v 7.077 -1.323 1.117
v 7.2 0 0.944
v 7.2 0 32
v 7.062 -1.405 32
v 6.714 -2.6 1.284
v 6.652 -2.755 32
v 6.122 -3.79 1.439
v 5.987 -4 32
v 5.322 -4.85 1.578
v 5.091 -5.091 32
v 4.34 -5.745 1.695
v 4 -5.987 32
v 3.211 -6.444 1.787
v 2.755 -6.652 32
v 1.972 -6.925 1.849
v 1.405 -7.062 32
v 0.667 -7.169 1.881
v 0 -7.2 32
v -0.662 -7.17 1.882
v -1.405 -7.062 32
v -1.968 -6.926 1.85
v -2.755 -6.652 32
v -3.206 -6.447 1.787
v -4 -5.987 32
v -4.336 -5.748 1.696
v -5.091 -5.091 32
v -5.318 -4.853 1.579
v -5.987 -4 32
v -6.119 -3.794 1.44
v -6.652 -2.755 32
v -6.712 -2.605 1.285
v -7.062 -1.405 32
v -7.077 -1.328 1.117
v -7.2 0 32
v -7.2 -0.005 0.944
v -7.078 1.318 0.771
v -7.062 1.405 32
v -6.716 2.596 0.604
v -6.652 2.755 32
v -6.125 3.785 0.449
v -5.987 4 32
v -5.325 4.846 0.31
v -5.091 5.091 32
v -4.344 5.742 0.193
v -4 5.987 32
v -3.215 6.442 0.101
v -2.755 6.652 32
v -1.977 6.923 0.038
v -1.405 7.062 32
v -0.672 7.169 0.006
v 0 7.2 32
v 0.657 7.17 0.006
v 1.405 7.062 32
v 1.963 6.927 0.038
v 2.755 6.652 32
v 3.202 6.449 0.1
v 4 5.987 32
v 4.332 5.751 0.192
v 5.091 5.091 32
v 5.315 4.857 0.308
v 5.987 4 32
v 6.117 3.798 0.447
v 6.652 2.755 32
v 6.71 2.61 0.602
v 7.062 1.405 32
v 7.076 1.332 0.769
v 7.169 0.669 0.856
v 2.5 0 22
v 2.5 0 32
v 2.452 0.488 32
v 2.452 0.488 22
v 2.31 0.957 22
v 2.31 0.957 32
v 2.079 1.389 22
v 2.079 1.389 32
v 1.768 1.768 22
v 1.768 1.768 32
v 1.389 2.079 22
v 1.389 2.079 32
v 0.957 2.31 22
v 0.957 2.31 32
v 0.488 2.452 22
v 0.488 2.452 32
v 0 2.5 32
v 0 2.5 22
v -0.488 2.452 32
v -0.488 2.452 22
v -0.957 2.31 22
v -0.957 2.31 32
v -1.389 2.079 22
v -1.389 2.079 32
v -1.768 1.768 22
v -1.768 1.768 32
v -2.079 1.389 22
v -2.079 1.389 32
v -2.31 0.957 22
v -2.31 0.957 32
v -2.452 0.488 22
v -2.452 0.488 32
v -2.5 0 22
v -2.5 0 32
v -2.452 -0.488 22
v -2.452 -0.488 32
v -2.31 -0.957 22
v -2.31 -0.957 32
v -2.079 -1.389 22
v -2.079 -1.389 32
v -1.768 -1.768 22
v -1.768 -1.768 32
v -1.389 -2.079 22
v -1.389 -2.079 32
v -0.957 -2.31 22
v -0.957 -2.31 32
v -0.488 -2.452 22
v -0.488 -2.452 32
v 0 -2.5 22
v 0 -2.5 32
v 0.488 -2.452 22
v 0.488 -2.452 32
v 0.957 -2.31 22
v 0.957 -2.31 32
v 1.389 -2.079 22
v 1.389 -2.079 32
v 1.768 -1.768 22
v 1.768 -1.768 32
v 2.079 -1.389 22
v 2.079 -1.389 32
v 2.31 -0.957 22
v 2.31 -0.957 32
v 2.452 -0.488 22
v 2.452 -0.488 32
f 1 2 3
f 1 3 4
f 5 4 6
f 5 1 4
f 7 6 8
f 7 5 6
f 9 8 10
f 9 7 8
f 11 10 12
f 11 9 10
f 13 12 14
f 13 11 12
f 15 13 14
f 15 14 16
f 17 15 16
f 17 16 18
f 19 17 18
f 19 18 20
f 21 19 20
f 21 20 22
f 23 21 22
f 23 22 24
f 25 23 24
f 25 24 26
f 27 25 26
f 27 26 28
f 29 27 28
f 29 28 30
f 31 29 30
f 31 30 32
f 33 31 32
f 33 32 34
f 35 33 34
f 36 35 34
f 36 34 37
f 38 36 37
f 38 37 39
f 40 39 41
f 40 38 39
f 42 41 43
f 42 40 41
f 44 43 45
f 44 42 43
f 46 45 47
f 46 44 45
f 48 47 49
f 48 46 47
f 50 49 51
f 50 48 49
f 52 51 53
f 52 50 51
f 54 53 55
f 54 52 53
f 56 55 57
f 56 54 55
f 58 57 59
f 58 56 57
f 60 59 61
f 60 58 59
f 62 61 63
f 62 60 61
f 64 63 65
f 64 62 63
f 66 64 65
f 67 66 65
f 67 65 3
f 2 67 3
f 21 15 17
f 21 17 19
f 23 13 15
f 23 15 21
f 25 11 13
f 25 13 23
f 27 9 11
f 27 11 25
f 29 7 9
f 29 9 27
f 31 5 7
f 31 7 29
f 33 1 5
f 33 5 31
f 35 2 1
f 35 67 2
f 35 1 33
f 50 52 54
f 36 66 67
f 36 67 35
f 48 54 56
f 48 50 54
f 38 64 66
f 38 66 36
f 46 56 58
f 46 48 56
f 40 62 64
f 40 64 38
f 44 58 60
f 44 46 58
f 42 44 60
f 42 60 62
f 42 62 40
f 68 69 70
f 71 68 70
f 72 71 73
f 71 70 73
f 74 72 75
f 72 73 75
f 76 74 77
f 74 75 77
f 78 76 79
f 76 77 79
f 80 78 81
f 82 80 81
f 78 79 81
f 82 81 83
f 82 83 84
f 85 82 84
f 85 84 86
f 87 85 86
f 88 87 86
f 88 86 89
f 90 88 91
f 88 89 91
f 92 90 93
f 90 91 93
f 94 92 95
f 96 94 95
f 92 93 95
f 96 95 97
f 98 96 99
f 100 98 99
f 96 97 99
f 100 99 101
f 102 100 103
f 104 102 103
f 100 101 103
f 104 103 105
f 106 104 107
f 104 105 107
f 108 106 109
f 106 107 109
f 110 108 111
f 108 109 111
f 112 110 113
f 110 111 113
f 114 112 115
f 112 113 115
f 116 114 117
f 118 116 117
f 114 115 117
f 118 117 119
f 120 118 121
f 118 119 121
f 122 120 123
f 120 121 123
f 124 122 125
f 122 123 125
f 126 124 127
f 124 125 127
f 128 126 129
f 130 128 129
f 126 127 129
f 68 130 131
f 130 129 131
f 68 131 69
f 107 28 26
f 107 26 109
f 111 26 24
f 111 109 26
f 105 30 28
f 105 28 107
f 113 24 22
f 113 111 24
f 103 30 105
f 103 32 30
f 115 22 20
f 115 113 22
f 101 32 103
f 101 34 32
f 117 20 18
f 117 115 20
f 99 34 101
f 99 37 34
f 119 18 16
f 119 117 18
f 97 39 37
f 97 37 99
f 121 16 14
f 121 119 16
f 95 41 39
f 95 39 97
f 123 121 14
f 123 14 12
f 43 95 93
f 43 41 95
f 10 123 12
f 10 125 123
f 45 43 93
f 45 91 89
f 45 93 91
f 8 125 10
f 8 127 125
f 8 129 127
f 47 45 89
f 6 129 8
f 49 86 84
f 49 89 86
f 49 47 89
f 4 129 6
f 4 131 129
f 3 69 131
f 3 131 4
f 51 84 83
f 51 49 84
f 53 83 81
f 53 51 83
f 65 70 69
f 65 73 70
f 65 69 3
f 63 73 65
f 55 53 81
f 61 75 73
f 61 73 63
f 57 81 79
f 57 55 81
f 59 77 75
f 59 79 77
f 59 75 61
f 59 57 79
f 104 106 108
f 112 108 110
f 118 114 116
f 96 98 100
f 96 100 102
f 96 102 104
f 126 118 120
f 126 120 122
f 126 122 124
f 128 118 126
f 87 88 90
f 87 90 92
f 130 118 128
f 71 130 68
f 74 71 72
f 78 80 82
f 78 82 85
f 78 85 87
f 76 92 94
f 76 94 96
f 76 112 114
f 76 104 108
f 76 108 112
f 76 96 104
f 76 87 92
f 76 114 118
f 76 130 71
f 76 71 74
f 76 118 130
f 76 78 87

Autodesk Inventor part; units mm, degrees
ref_plane "YZ Plane" through (0, 0, 0) normal (1, 0, 0) x (0, 1, 0)
ref_plane "XZ Plane" through (0, 0, 0) normal (0, 1, 0) x (-1, 0, 0)
ref_plane "XY Plane" through (0, 0, 0) normal (0, 0, 1) x (1, 0, 0)
sketch "Sketch1" plane through (0, 0, 0) normal (0, 0, 1) x (1, 0, 0)
  circle A0 centre (0, 0) radius 7.2
  dimension "d0" = 14.4
extrude "Extrusion1" add sketch "Sketch1" along normal blind 32
sketch "Sketch2" plane through (0, 0, 32) normal (0, 0, 1) x (1, 0, 0)
  circle A0 centre (0, 0) radius 2.5
  dimension "d3" = 5
extrude "Extrusion2" cut sketch "Sketch2" against normal blind 10
sketch "Sketch3" plane through (0, 0, 0) normal (0, 0, 1) x (1, 0, 0)
  circle A0 centre (0, 0) radius 7.2 projected
  line L0 (11.2434, 7.2) -> (-13.4853, 7.2) construction
ref_plane "Work Plane1" through (11.2434, 7.2, 0) normal (0, -0.1297, -0.9916) x (-1, 0, 0)
sketch "Sketch4" plane through (11.2434, 7.2, 0) normal (0, -0.1297, -0.9916) x (-1, 0, 0)
  line L0 (30.8181, -24.4459) -> (-8.3313, -24.4459)
  line L1 (-8.3313, -24.4459) -> (-8.3313, 10.1675)
  line L2 (-8.3313, 10.1675) -> (30.8181, 10.1675)
  line L3 (30.8181, 10.1675) -> (30.8181, -24.4459)
  line L4 (30.8181, -24.4459) -> (-8.3313, 10.1675) construction
  line L5 (-8.3313, -24.4459) -> (30.8181, 10.1675) construction
  point P0 (11.2434, -7.1392)
extrude "Extrusion3" cut sketch "Sketch4" along normal blind 10
properties part number "HoleFill1"
